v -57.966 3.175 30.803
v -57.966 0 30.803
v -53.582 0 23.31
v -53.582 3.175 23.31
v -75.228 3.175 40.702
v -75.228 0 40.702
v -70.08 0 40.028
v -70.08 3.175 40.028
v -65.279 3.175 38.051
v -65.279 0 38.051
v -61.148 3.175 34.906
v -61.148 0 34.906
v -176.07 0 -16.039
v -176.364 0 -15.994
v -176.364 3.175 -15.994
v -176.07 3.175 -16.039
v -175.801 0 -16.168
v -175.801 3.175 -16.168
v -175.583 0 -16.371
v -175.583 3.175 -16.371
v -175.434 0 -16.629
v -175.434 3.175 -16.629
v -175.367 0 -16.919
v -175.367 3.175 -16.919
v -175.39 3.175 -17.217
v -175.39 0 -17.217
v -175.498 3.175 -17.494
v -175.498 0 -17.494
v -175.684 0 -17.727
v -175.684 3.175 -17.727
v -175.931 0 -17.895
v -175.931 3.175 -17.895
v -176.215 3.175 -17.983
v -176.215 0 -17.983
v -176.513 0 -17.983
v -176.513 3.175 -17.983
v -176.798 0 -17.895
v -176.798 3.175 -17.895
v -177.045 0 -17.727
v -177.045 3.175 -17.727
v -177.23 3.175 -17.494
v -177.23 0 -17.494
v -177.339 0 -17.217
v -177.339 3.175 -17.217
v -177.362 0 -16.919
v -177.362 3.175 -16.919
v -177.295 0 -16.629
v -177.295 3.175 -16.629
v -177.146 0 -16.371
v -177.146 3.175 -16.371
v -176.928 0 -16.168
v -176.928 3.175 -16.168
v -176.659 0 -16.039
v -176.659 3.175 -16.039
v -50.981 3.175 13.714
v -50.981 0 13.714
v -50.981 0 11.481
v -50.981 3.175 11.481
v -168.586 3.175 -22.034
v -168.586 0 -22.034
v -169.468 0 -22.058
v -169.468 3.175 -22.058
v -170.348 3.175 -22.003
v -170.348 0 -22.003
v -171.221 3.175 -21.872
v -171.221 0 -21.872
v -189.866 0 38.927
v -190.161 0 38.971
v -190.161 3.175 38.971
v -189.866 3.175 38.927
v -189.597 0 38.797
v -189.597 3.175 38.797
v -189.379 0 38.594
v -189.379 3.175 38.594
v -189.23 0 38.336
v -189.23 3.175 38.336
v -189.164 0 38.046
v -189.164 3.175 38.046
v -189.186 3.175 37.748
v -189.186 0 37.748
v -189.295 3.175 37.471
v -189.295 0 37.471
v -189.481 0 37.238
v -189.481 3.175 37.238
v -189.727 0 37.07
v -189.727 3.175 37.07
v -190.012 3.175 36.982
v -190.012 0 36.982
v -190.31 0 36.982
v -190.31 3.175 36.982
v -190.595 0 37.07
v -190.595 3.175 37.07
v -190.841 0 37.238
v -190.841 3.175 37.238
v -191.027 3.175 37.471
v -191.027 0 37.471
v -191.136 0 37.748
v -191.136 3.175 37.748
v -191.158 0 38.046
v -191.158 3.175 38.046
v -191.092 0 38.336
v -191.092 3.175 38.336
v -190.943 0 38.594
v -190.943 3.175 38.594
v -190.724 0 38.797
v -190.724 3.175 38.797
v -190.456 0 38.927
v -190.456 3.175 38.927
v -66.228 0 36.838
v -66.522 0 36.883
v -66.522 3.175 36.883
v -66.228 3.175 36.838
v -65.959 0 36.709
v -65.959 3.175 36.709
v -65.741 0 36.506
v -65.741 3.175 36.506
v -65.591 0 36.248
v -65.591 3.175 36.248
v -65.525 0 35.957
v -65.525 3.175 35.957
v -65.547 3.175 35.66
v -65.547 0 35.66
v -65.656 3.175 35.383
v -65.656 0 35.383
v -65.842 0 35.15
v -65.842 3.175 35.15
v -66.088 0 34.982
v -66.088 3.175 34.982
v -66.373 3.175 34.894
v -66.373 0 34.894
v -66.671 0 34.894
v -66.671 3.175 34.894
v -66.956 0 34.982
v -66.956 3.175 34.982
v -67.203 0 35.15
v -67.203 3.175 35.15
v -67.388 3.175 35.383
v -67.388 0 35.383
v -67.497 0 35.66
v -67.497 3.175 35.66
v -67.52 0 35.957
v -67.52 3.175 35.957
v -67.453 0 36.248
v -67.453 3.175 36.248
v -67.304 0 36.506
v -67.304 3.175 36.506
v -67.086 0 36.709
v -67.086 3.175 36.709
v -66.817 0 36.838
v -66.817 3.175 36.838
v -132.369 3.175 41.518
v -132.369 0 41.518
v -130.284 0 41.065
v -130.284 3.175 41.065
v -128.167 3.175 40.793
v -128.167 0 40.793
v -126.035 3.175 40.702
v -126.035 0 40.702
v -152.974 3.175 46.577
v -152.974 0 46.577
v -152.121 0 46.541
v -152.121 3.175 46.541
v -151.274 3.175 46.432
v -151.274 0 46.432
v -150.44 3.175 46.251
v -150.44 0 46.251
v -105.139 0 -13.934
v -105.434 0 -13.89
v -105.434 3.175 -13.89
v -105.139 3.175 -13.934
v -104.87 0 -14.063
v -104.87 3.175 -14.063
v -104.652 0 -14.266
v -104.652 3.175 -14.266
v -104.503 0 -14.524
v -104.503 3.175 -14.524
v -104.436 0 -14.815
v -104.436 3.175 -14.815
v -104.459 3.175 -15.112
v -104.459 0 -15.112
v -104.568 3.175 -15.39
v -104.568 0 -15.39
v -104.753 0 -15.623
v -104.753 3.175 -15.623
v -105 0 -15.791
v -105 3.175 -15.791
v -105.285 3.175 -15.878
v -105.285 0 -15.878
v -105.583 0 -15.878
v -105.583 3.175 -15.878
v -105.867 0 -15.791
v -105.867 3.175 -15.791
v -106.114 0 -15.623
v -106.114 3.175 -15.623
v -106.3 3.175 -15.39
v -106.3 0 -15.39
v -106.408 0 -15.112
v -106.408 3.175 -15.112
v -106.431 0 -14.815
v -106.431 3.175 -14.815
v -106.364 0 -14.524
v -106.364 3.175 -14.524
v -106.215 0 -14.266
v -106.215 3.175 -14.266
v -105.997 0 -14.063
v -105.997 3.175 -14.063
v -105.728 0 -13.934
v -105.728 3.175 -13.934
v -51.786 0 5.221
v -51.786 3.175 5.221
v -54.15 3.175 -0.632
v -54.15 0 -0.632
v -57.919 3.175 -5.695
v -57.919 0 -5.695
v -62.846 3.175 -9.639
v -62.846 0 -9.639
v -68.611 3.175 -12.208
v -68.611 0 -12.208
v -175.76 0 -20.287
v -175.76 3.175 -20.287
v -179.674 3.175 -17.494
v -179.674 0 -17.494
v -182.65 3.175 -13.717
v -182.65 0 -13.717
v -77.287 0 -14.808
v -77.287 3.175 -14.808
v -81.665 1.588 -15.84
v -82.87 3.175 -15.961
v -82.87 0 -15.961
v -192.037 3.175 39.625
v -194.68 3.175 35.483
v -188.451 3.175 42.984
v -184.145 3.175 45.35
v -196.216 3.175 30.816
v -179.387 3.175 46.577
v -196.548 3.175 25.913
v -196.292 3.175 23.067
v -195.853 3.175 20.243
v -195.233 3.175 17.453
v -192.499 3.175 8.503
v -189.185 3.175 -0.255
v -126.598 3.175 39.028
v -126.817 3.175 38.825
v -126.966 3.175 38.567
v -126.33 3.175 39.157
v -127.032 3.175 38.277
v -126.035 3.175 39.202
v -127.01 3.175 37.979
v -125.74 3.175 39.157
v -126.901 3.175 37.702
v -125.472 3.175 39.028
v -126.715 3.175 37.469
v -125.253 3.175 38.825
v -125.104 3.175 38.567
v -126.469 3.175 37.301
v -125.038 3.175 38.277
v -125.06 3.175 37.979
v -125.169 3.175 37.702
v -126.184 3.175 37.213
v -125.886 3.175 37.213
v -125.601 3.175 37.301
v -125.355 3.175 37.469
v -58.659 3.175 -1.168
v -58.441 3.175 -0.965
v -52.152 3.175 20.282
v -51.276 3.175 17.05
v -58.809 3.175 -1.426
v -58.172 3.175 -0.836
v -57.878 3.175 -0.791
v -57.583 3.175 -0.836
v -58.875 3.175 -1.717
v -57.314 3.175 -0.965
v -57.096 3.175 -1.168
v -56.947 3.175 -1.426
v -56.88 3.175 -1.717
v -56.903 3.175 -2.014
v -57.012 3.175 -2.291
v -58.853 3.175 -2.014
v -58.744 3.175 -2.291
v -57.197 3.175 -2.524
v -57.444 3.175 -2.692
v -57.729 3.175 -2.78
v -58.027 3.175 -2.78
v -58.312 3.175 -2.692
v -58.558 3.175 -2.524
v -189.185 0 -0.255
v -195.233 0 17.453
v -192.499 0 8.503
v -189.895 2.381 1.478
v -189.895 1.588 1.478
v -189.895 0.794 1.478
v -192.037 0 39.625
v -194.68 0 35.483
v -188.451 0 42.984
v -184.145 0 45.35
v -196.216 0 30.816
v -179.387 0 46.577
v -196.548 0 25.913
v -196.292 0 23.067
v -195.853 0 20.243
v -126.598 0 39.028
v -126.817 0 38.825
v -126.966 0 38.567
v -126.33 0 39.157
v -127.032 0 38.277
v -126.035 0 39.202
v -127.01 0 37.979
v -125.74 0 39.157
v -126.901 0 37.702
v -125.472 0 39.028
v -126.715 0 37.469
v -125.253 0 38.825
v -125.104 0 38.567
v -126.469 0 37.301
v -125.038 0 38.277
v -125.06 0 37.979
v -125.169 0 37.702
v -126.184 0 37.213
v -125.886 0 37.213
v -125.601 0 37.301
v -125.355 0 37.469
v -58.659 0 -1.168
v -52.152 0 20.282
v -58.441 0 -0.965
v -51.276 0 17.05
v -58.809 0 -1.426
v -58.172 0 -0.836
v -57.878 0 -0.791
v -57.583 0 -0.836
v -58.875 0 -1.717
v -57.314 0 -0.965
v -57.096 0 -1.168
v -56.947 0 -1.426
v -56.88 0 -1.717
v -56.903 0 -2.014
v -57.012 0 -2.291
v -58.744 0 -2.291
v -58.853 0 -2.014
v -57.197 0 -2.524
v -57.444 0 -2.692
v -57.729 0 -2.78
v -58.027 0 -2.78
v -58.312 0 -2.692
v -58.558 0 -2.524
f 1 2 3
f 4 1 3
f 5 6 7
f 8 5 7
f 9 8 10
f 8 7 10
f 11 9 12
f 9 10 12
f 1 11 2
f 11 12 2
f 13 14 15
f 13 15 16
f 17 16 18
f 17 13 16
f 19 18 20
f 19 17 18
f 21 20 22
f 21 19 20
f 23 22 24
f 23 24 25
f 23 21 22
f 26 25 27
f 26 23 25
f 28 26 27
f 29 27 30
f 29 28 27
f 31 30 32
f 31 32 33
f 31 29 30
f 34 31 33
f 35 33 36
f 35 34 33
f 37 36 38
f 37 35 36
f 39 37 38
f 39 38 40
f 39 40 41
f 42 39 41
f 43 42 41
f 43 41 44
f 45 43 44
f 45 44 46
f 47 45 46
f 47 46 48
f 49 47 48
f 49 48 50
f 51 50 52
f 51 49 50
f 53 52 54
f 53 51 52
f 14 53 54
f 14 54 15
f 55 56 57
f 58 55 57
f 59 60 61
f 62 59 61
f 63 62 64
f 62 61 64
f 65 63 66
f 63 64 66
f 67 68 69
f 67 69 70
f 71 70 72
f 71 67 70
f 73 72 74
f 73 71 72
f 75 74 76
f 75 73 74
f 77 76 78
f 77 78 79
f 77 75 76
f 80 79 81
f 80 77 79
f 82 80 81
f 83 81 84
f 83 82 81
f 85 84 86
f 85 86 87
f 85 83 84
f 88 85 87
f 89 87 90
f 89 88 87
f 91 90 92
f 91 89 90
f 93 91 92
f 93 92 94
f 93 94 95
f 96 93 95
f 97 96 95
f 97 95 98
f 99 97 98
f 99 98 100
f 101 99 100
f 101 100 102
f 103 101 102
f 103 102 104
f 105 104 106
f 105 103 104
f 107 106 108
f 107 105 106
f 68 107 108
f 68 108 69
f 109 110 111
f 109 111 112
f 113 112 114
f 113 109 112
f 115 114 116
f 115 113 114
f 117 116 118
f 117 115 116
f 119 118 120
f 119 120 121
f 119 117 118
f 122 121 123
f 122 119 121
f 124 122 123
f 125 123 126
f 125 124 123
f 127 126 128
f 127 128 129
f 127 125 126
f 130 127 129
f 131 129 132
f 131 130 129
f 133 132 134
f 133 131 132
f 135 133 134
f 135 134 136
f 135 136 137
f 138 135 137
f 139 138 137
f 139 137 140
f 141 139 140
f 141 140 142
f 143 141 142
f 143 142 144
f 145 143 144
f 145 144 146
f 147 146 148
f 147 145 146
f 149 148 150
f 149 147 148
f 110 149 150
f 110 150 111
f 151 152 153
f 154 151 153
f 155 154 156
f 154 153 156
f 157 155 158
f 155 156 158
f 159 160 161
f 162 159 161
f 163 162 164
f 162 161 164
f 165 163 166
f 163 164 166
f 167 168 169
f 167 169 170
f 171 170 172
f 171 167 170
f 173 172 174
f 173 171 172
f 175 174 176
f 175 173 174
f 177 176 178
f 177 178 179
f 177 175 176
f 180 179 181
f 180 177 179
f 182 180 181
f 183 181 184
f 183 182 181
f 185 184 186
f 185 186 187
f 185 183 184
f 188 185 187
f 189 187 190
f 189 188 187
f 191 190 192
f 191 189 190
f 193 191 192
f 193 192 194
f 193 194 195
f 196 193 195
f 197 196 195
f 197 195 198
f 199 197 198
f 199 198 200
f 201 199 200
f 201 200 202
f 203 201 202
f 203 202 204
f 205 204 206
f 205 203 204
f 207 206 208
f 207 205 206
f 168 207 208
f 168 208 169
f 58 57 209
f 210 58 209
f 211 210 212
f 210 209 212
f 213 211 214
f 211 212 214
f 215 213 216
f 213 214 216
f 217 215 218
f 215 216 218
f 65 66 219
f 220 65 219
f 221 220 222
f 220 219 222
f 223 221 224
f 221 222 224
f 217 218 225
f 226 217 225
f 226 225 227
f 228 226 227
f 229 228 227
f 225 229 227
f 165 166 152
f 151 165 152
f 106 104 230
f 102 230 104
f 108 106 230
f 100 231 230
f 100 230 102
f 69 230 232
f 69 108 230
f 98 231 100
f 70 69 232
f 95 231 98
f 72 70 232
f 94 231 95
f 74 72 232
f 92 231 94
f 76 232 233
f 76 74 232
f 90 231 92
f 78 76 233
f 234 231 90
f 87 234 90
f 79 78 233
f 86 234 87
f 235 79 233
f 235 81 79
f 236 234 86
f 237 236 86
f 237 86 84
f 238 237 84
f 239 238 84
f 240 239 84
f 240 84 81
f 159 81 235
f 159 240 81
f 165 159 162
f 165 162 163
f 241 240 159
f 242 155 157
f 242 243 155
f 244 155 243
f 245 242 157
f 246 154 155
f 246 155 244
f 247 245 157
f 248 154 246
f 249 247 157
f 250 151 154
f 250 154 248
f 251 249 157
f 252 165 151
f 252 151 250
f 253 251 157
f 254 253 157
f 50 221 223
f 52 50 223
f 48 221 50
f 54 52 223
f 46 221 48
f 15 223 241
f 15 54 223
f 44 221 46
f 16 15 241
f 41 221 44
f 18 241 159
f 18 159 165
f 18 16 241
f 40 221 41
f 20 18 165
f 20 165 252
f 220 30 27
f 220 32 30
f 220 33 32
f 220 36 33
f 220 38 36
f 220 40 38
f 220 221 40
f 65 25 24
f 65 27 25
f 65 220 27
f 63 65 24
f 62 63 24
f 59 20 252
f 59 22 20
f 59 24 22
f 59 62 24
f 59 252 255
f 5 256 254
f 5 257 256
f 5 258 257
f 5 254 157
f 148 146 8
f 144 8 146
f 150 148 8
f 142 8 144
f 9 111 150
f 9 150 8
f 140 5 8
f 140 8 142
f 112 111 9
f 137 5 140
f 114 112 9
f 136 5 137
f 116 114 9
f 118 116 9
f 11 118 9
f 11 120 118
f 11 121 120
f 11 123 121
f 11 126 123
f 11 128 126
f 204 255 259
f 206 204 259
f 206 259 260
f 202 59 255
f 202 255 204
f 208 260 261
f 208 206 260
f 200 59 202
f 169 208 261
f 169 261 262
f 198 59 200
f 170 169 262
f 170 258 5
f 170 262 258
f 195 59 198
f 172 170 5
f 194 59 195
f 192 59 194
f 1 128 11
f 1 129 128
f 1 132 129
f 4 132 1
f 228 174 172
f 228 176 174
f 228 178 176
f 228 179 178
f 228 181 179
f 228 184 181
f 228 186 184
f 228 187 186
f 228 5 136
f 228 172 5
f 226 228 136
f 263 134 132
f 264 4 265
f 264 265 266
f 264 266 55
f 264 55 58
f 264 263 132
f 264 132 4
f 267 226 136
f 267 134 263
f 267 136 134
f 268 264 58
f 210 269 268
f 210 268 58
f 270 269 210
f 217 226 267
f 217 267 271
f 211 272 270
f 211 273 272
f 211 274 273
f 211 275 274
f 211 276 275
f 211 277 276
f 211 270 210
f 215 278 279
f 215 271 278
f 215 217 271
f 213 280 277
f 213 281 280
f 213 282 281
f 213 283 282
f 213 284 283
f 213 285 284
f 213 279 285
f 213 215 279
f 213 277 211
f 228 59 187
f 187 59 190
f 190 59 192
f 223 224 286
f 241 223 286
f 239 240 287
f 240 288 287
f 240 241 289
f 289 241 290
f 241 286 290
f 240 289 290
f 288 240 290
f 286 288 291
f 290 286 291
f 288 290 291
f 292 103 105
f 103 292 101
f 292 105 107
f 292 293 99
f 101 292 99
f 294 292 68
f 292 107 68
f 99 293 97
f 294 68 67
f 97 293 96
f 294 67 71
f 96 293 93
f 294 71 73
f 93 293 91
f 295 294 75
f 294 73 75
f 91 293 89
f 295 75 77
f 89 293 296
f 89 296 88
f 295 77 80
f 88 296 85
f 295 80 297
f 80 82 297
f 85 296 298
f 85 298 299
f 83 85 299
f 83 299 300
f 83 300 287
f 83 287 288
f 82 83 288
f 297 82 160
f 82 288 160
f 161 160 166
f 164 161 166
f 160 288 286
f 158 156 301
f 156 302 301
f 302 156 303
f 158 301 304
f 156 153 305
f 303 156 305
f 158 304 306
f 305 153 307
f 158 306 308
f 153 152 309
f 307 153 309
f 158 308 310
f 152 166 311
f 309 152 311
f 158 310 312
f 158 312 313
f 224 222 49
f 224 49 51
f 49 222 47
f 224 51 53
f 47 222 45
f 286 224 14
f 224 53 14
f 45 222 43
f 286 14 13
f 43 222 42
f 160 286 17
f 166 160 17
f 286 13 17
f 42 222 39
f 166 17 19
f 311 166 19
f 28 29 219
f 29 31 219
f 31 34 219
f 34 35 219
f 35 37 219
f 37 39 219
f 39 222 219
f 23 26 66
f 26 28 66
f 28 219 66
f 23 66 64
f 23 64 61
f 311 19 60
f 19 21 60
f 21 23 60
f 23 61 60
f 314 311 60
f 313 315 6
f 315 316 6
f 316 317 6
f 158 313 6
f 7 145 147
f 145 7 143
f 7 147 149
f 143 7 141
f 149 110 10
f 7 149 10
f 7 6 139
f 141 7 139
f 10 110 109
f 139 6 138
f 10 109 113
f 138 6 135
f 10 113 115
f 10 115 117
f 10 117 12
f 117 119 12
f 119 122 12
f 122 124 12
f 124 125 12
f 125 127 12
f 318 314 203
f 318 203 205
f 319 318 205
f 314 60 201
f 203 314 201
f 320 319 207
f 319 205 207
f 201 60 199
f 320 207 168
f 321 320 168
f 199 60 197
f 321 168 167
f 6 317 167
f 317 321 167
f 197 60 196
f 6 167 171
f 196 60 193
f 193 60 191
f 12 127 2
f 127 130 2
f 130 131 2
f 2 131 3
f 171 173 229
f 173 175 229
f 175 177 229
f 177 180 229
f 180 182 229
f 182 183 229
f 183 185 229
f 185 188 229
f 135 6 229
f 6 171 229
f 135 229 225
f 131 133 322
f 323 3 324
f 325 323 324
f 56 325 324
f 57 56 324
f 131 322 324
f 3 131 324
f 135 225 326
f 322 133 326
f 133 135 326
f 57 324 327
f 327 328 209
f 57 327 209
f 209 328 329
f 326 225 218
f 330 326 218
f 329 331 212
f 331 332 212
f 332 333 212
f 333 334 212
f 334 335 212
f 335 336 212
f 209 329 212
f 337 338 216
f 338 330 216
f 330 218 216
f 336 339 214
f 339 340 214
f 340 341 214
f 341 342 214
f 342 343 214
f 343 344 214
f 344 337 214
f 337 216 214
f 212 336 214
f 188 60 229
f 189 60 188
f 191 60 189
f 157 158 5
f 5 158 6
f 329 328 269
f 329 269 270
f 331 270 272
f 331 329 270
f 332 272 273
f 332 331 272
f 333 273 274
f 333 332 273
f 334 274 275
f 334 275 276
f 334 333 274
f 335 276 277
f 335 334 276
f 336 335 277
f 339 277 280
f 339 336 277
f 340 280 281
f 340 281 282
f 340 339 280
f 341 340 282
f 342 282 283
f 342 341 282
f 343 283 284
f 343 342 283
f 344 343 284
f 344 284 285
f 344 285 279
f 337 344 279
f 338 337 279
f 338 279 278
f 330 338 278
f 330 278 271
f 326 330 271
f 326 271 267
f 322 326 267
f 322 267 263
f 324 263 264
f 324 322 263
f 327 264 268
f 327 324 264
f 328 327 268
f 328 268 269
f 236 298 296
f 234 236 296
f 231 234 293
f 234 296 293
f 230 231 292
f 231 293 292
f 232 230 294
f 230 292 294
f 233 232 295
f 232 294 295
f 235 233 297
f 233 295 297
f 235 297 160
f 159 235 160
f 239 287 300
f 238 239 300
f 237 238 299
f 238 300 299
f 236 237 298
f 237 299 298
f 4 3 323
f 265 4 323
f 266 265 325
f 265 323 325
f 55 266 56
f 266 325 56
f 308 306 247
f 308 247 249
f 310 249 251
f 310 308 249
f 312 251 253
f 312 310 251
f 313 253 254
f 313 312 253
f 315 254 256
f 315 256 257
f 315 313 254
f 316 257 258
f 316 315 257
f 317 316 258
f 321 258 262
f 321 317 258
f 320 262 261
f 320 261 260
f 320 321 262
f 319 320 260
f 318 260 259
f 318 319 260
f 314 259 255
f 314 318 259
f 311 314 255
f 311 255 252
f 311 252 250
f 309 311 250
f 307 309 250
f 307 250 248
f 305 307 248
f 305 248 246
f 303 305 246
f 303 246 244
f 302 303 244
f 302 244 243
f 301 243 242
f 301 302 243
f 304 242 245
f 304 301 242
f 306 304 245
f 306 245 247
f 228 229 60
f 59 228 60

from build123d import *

# Parameters (mm, degrees)
SKETCH2_R           = 1
BOSS_EXTRUDE1_DEPTH = 3.175


with BuildPart() as part:
    # Sketch2 → Boss-Extrude1 (new body)
    with BuildSketch(Plane(origin=(0, 0, 0), x_dir=(1, 0, 0), z_dir=(0, 1, 0))):
        with BuildLine():
            Line((-179.386599243, -46.577112428), (-152.973973641, -46.577112428))
            ThreePointArc((-152.973973641, -46.577112428), (-151.696632976, -46.495196962), (-150.440219102, -46.250792593))
            Line((-150.440219102, -46.250792593), (-132.369306257, -41.517613837))
            ThreePointArc((-132.369306257, -41.517613837), (-129.228271572, -40.906602915), (-126.03491991, -40.70181425))
            Line((-126.03491991, -40.70181425), (-75.228071606, -40.70181425))
            ThreePointArc((-75.228071606, -40.70181425), (-65.278674057, -38.051439272), (-57.966239939, -30.802763092))
            Line((-57.966239939, -30.802763092), (-53.58197864, -23.310359981))
            ThreePointArc((-53.58197864, -23.310359981), (-51.642560943, -18.685572059), (-50.980718724, -13.714458582))
            Line((-50.980718724, -13.714458582), (-50.980718724, -11.480720615))
            ThreePointArc((-50.980718724, -11.480720615), (-55.872159917, 3.284056393), (-68.611443065, 12.207928979))
            Line((-68.611443065, 12.207928979), (-77.287357217, 14.807803777))
            add(Edge.make_bspline(
                [(-77.287357217, 14.807803777), (-78.60290824, 15.260617984), (-80.496334385, 15.662389675), (-81.330596094, 15.796728052), (-81.912447463, 15.872382986), (-82.202137874, 15.903094978), (-82.558274171, 15.939367788), (-82.869941903, 15.961449205)],
                knots=[0.680418275, 0.680418275, 0.680418275, 0.836668275, 0.899168275, 0.935139496, 0.961668275, 0.966389496, 1, 1, 1], degree=2))
            Line((-82.869941903, 15.961449205), (-168.585599211, 22.03433695))
            ThreePointArc((-168.585599211, 22.03433695), (-169.908476001, 22.040340453), (-171.220569819, 21.871672567))
            ThreePointArc((-171.220569819, 21.871672567), (-177.816509337, 19.029235729), (-182.649967908, 13.716652219))
            add(Edge.make_bspline(
                [(-182.649967908, 13.716652219), (-184.020157032, 11.266604381), (-186.59553254, 6.270980952), (-189.973739026, -1.442317999), (-192.87751868, -9.367305357), (-194.495666875, -14.743968327), (-195.233463462, -17.45250711)],
                knots=[0.255798806, 0.255798806, 0.255798806, 0.255798806, 0.412929873, 0.570060941, 0.727192008, 0.884323076, 0.884323076, 0.884323076, 0.884323076], degree=3))
            ThreePointArc((-195.233463462, -17.45250711), (-196.09568693, -21.651142502), (-196.548238057, -25.913438355))
            ThreePointArc((-196.548238057, -25.913438355), (-192.037135811, -39.625265598), (-179.386599243, -46.577112428))
        make_face()
        with Locations(Location((-66.522348751, -35.882736145, 0), (0, 0, 270))):
            Circle(SKETCH2_R, mode=Mode.SUBTRACT)
        with Locations(Location((-57.877663419, 1.791422578, 0), (0, 0, 270))):
            Circle(SKETCH2_R, mode=Mode.SUBTRACT)
        with Locations(Location((-105.433568659, 14.889534132, 0), (0, 0, 270))):
            Circle(SKETCH2_R, mode=Mode.SUBTRACT)
        with Locations(Location((-176.36445576, 16.994158234, 0), (0, 0, 270))):
            Circle(SKETCH2_R, mode=Mode.SUBTRACT)
        with Locations(Location((-190.160816791, -37.970957718, 0), (0, 0, 270))):
            Circle(SKETCH2_R, mode=Mode.SUBTRACT)
        with Locations(Location((-126.03491991, -38.20181425, 0), (0, 0, 270))):
            Circle(SKETCH2_R, mode=Mode.SUBTRACT)
    extrude(amount=BOSS_EXTRUDE1_DEPTH)


solid = part.part
